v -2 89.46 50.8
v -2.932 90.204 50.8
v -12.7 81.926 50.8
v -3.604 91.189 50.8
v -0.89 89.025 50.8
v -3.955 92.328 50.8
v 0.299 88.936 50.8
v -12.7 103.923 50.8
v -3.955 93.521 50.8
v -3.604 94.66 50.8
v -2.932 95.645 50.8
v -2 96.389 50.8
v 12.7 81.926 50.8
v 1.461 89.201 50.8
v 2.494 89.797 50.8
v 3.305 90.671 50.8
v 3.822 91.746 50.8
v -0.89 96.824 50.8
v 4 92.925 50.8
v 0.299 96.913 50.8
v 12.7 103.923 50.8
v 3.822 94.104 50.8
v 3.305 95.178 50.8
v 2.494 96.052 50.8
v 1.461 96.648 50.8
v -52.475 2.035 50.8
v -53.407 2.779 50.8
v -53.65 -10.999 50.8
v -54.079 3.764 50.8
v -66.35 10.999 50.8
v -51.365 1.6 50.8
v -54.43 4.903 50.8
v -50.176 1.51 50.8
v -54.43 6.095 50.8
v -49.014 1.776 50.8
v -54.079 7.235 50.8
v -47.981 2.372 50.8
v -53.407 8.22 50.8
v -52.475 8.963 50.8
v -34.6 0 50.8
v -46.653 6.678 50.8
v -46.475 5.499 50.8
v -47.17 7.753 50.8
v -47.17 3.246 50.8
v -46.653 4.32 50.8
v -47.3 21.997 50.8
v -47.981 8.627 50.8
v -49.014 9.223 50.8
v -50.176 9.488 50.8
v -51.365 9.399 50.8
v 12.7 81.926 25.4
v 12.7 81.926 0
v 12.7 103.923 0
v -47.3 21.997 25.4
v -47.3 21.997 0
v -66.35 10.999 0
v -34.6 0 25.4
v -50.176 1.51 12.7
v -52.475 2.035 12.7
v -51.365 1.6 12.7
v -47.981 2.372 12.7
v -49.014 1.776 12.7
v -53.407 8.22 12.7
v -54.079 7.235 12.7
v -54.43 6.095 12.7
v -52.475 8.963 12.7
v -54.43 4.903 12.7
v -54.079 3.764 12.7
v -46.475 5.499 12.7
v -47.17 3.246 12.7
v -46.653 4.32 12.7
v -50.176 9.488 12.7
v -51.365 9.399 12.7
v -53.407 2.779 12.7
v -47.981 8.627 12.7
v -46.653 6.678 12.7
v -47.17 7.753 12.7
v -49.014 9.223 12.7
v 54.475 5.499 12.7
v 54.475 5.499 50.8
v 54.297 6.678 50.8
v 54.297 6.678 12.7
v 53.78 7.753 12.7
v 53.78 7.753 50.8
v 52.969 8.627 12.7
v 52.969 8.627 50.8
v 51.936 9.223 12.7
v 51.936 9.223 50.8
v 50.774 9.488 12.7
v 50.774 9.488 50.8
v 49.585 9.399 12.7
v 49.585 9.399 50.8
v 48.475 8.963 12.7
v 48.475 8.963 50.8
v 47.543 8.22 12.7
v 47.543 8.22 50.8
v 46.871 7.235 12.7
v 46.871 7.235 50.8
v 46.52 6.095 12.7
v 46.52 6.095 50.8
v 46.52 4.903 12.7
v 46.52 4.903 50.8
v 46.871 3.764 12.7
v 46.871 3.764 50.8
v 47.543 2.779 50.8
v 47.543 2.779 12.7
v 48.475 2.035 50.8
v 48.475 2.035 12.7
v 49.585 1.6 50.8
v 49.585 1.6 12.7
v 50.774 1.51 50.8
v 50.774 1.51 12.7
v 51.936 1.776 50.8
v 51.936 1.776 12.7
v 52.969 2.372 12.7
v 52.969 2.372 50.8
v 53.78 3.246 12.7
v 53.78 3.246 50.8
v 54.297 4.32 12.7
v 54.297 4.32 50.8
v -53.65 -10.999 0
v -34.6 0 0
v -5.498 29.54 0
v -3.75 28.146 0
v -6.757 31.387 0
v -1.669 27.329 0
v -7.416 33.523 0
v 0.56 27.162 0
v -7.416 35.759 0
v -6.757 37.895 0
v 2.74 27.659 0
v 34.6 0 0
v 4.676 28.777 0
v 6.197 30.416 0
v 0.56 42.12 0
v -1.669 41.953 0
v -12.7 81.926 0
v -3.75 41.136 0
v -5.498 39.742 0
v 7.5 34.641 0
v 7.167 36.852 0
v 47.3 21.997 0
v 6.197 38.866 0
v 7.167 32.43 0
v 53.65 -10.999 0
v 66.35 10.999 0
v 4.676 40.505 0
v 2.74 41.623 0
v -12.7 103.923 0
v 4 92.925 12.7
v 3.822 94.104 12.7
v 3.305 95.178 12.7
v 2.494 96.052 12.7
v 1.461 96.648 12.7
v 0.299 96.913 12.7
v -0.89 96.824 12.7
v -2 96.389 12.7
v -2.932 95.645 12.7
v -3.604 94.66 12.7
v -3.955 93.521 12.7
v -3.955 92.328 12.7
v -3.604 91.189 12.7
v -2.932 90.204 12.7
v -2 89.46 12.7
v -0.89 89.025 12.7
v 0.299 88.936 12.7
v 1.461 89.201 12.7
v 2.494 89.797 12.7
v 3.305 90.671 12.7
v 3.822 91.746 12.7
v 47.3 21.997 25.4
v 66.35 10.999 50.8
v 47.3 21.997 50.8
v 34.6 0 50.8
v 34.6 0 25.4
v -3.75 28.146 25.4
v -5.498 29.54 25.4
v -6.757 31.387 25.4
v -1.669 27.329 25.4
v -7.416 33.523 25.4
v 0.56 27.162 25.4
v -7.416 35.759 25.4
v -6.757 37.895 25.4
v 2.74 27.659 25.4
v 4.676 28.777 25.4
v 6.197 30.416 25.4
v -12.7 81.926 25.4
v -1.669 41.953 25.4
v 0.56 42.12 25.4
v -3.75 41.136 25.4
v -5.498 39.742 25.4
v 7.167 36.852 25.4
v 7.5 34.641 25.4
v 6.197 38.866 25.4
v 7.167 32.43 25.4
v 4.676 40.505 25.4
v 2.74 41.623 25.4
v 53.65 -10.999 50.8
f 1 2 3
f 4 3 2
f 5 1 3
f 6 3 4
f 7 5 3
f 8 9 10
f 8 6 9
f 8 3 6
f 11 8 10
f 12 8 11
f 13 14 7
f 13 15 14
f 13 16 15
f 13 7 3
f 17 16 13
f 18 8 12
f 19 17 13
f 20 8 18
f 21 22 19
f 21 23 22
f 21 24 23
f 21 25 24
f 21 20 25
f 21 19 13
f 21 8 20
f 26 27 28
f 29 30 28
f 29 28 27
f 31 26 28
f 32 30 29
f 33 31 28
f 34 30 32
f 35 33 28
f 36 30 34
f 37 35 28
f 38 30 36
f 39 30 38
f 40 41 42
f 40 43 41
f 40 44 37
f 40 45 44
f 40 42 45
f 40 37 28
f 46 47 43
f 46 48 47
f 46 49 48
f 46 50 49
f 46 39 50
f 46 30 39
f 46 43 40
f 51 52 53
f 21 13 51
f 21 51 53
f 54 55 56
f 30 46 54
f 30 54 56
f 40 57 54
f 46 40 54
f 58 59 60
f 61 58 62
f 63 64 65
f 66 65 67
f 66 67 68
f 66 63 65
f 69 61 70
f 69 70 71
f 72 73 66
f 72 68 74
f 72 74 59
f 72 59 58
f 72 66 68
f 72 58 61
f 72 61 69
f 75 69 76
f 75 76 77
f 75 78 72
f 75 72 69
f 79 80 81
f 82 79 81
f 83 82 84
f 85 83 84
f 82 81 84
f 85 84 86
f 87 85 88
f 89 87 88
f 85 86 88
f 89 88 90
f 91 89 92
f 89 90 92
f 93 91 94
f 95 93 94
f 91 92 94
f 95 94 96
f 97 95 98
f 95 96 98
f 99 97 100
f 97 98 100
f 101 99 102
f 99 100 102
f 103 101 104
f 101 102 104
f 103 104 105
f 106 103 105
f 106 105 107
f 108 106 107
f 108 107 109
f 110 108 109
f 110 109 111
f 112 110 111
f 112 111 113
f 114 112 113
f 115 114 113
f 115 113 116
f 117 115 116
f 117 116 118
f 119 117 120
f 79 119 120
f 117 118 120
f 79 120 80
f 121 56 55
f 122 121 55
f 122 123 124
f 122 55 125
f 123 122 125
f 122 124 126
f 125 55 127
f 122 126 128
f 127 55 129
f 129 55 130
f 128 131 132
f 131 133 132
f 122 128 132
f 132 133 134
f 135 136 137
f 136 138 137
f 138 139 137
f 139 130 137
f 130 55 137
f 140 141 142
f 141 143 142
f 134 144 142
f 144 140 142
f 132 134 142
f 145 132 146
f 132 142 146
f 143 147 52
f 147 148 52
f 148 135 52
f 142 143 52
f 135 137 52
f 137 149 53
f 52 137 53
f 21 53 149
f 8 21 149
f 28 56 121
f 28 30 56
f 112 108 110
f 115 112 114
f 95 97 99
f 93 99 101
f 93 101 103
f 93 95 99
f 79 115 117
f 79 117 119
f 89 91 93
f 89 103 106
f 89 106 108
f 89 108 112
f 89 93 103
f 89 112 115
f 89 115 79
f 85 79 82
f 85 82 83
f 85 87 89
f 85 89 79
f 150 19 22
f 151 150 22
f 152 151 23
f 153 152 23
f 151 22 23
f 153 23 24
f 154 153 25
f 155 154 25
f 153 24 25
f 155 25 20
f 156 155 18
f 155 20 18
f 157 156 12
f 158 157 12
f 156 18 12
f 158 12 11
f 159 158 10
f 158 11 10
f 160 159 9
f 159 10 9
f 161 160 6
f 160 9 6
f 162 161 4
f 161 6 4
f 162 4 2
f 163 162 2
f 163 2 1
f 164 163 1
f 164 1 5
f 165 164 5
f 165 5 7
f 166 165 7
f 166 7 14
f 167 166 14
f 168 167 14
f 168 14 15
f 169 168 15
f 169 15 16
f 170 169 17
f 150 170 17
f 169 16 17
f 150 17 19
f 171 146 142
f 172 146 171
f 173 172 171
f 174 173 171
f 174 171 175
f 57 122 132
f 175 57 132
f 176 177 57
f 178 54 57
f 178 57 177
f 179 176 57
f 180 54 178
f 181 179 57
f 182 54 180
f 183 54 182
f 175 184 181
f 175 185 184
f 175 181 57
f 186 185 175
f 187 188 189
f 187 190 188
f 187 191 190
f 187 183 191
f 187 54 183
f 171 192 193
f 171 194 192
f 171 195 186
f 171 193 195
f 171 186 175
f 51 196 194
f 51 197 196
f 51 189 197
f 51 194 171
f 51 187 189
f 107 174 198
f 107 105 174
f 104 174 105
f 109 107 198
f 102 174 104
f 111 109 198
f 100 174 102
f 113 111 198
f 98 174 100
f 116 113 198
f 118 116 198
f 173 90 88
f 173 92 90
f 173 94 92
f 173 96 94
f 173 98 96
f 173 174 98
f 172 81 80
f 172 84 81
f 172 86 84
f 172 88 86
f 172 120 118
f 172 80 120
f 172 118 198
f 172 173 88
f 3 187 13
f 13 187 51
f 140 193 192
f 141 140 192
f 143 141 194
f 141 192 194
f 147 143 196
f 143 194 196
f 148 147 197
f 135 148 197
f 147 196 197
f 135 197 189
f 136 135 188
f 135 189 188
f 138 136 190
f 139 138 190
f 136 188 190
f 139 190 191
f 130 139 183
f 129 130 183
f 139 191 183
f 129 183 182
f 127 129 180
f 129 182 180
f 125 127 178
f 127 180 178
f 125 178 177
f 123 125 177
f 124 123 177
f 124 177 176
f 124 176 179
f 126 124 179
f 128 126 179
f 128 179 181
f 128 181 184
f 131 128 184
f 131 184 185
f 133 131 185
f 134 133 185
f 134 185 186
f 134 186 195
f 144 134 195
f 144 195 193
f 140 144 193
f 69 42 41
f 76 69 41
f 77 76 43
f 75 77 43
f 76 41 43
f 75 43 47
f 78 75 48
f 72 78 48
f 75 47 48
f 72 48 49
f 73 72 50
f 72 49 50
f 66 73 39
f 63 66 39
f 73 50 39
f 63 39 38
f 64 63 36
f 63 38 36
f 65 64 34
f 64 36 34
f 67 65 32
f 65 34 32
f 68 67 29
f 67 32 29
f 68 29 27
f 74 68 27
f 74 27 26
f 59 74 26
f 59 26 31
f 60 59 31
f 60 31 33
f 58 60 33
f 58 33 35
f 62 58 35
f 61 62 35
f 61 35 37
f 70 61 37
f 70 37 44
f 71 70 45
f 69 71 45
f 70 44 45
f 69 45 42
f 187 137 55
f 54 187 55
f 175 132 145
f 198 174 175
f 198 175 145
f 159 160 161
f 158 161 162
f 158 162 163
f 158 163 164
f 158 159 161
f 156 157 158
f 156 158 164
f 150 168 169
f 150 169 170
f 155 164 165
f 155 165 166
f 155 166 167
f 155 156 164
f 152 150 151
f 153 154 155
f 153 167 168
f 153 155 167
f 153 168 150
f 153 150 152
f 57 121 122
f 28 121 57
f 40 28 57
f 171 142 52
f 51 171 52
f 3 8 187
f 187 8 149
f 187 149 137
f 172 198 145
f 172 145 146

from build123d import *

# Parameters (mm, degrees)
F1_DEPTH = 25.4
F3_DEPTH = 25.4
F4_DEPTH = 25.4
F5_R     = 4
F6_DEPTH = 38.1
F7_R     = 7.5
F8_DEPTH = 254


with BuildPart() as f1:
    # F0 (on Top) → F1 (new body)
    with BuildSketch(Plane.XY):
        Polygon((0, 103.923048), (-60, 0), (60, 0), align=None)
    extrude(amount=F1_DEPTH)

    # F2 (on face) → F3 (join)
    with BuildSketch(Plane.XY.offset(25.4)):
        Polygon((12.7, 103.923048), (0, 103.923048), (12.7, 81.926003), align=None)
        Polygon((66.35, 10.998523), (47.3, 21.997045), (60, 0), align=None)
        Polygon((-60, 0), (-47.3, 21.997045), (-66.35, 10.998523), align=None)
        Polygon((-53.65, -10.998523), (-34.6, 0), (-60, 0), align=None)
        Polygon((12.7, 81.926003), (0, 103.923048), (-12.7, 81.926003), align=None)
        Polygon((60, 0), (47.3, 21.997045), (34.6, 0), align=None)
        Polygon((-34.6, 0), (-47.3, 21.997045), (-60, 0), align=None)
        Polygon((60, 0), (34.6, 0), (53.65, -10.998523), align=None)
        Polygon((-12.7, 81.926003), (0, 103.923048), (-12.7, 103.923048), align=None)
    extrude(amount=F3_DEPTH)

    # F2 (on face) → F4 (join)
    with BuildSketch(Plane.XY.offset(25.4)):
        Polygon((12.7, 103.923048), (0, 103.923048), (-12.7, 103.923048), (-12.7, 81.926003), (12.7, 81.926003), align=None)
        Polygon((53.65, -10.998523), (60, 0), (66.35, 10.998523), (47.3, 21.997045), (34.6, 0), align=None)
        Polygon((-66.35, 10.998523), (-60, 0), (-53.65, -10.998523), (-34.6, 0), (-47.3, 21.997045), align=None)
    extrude(amount=-F4_DEPTH)

    # F5 (on face) → F6 (cut)
    with BuildSketch(Plane.XY.offset(50.8)):
        with Locations((0, 92.924526)):
            Circle(F5_R)
        with Locations((-50.475, 5.499261)):
            Circle(F5_R)
        with Locations((50.475, 5.499261)):
            Circle(F5_R)
    extrude(amount=-F6_DEPTH, mode=Mode.SUBTRACT)

    # F7 (on face) → F8 (cut)
    with BuildSketch(Plane.XY.offset(50.8)):
        with Locations((0, 34.641016)):
            Circle(F7_R)
    extrude(amount=-F8_DEPTH, mode=Mode.SUBTRACT)


solid = f1.part
